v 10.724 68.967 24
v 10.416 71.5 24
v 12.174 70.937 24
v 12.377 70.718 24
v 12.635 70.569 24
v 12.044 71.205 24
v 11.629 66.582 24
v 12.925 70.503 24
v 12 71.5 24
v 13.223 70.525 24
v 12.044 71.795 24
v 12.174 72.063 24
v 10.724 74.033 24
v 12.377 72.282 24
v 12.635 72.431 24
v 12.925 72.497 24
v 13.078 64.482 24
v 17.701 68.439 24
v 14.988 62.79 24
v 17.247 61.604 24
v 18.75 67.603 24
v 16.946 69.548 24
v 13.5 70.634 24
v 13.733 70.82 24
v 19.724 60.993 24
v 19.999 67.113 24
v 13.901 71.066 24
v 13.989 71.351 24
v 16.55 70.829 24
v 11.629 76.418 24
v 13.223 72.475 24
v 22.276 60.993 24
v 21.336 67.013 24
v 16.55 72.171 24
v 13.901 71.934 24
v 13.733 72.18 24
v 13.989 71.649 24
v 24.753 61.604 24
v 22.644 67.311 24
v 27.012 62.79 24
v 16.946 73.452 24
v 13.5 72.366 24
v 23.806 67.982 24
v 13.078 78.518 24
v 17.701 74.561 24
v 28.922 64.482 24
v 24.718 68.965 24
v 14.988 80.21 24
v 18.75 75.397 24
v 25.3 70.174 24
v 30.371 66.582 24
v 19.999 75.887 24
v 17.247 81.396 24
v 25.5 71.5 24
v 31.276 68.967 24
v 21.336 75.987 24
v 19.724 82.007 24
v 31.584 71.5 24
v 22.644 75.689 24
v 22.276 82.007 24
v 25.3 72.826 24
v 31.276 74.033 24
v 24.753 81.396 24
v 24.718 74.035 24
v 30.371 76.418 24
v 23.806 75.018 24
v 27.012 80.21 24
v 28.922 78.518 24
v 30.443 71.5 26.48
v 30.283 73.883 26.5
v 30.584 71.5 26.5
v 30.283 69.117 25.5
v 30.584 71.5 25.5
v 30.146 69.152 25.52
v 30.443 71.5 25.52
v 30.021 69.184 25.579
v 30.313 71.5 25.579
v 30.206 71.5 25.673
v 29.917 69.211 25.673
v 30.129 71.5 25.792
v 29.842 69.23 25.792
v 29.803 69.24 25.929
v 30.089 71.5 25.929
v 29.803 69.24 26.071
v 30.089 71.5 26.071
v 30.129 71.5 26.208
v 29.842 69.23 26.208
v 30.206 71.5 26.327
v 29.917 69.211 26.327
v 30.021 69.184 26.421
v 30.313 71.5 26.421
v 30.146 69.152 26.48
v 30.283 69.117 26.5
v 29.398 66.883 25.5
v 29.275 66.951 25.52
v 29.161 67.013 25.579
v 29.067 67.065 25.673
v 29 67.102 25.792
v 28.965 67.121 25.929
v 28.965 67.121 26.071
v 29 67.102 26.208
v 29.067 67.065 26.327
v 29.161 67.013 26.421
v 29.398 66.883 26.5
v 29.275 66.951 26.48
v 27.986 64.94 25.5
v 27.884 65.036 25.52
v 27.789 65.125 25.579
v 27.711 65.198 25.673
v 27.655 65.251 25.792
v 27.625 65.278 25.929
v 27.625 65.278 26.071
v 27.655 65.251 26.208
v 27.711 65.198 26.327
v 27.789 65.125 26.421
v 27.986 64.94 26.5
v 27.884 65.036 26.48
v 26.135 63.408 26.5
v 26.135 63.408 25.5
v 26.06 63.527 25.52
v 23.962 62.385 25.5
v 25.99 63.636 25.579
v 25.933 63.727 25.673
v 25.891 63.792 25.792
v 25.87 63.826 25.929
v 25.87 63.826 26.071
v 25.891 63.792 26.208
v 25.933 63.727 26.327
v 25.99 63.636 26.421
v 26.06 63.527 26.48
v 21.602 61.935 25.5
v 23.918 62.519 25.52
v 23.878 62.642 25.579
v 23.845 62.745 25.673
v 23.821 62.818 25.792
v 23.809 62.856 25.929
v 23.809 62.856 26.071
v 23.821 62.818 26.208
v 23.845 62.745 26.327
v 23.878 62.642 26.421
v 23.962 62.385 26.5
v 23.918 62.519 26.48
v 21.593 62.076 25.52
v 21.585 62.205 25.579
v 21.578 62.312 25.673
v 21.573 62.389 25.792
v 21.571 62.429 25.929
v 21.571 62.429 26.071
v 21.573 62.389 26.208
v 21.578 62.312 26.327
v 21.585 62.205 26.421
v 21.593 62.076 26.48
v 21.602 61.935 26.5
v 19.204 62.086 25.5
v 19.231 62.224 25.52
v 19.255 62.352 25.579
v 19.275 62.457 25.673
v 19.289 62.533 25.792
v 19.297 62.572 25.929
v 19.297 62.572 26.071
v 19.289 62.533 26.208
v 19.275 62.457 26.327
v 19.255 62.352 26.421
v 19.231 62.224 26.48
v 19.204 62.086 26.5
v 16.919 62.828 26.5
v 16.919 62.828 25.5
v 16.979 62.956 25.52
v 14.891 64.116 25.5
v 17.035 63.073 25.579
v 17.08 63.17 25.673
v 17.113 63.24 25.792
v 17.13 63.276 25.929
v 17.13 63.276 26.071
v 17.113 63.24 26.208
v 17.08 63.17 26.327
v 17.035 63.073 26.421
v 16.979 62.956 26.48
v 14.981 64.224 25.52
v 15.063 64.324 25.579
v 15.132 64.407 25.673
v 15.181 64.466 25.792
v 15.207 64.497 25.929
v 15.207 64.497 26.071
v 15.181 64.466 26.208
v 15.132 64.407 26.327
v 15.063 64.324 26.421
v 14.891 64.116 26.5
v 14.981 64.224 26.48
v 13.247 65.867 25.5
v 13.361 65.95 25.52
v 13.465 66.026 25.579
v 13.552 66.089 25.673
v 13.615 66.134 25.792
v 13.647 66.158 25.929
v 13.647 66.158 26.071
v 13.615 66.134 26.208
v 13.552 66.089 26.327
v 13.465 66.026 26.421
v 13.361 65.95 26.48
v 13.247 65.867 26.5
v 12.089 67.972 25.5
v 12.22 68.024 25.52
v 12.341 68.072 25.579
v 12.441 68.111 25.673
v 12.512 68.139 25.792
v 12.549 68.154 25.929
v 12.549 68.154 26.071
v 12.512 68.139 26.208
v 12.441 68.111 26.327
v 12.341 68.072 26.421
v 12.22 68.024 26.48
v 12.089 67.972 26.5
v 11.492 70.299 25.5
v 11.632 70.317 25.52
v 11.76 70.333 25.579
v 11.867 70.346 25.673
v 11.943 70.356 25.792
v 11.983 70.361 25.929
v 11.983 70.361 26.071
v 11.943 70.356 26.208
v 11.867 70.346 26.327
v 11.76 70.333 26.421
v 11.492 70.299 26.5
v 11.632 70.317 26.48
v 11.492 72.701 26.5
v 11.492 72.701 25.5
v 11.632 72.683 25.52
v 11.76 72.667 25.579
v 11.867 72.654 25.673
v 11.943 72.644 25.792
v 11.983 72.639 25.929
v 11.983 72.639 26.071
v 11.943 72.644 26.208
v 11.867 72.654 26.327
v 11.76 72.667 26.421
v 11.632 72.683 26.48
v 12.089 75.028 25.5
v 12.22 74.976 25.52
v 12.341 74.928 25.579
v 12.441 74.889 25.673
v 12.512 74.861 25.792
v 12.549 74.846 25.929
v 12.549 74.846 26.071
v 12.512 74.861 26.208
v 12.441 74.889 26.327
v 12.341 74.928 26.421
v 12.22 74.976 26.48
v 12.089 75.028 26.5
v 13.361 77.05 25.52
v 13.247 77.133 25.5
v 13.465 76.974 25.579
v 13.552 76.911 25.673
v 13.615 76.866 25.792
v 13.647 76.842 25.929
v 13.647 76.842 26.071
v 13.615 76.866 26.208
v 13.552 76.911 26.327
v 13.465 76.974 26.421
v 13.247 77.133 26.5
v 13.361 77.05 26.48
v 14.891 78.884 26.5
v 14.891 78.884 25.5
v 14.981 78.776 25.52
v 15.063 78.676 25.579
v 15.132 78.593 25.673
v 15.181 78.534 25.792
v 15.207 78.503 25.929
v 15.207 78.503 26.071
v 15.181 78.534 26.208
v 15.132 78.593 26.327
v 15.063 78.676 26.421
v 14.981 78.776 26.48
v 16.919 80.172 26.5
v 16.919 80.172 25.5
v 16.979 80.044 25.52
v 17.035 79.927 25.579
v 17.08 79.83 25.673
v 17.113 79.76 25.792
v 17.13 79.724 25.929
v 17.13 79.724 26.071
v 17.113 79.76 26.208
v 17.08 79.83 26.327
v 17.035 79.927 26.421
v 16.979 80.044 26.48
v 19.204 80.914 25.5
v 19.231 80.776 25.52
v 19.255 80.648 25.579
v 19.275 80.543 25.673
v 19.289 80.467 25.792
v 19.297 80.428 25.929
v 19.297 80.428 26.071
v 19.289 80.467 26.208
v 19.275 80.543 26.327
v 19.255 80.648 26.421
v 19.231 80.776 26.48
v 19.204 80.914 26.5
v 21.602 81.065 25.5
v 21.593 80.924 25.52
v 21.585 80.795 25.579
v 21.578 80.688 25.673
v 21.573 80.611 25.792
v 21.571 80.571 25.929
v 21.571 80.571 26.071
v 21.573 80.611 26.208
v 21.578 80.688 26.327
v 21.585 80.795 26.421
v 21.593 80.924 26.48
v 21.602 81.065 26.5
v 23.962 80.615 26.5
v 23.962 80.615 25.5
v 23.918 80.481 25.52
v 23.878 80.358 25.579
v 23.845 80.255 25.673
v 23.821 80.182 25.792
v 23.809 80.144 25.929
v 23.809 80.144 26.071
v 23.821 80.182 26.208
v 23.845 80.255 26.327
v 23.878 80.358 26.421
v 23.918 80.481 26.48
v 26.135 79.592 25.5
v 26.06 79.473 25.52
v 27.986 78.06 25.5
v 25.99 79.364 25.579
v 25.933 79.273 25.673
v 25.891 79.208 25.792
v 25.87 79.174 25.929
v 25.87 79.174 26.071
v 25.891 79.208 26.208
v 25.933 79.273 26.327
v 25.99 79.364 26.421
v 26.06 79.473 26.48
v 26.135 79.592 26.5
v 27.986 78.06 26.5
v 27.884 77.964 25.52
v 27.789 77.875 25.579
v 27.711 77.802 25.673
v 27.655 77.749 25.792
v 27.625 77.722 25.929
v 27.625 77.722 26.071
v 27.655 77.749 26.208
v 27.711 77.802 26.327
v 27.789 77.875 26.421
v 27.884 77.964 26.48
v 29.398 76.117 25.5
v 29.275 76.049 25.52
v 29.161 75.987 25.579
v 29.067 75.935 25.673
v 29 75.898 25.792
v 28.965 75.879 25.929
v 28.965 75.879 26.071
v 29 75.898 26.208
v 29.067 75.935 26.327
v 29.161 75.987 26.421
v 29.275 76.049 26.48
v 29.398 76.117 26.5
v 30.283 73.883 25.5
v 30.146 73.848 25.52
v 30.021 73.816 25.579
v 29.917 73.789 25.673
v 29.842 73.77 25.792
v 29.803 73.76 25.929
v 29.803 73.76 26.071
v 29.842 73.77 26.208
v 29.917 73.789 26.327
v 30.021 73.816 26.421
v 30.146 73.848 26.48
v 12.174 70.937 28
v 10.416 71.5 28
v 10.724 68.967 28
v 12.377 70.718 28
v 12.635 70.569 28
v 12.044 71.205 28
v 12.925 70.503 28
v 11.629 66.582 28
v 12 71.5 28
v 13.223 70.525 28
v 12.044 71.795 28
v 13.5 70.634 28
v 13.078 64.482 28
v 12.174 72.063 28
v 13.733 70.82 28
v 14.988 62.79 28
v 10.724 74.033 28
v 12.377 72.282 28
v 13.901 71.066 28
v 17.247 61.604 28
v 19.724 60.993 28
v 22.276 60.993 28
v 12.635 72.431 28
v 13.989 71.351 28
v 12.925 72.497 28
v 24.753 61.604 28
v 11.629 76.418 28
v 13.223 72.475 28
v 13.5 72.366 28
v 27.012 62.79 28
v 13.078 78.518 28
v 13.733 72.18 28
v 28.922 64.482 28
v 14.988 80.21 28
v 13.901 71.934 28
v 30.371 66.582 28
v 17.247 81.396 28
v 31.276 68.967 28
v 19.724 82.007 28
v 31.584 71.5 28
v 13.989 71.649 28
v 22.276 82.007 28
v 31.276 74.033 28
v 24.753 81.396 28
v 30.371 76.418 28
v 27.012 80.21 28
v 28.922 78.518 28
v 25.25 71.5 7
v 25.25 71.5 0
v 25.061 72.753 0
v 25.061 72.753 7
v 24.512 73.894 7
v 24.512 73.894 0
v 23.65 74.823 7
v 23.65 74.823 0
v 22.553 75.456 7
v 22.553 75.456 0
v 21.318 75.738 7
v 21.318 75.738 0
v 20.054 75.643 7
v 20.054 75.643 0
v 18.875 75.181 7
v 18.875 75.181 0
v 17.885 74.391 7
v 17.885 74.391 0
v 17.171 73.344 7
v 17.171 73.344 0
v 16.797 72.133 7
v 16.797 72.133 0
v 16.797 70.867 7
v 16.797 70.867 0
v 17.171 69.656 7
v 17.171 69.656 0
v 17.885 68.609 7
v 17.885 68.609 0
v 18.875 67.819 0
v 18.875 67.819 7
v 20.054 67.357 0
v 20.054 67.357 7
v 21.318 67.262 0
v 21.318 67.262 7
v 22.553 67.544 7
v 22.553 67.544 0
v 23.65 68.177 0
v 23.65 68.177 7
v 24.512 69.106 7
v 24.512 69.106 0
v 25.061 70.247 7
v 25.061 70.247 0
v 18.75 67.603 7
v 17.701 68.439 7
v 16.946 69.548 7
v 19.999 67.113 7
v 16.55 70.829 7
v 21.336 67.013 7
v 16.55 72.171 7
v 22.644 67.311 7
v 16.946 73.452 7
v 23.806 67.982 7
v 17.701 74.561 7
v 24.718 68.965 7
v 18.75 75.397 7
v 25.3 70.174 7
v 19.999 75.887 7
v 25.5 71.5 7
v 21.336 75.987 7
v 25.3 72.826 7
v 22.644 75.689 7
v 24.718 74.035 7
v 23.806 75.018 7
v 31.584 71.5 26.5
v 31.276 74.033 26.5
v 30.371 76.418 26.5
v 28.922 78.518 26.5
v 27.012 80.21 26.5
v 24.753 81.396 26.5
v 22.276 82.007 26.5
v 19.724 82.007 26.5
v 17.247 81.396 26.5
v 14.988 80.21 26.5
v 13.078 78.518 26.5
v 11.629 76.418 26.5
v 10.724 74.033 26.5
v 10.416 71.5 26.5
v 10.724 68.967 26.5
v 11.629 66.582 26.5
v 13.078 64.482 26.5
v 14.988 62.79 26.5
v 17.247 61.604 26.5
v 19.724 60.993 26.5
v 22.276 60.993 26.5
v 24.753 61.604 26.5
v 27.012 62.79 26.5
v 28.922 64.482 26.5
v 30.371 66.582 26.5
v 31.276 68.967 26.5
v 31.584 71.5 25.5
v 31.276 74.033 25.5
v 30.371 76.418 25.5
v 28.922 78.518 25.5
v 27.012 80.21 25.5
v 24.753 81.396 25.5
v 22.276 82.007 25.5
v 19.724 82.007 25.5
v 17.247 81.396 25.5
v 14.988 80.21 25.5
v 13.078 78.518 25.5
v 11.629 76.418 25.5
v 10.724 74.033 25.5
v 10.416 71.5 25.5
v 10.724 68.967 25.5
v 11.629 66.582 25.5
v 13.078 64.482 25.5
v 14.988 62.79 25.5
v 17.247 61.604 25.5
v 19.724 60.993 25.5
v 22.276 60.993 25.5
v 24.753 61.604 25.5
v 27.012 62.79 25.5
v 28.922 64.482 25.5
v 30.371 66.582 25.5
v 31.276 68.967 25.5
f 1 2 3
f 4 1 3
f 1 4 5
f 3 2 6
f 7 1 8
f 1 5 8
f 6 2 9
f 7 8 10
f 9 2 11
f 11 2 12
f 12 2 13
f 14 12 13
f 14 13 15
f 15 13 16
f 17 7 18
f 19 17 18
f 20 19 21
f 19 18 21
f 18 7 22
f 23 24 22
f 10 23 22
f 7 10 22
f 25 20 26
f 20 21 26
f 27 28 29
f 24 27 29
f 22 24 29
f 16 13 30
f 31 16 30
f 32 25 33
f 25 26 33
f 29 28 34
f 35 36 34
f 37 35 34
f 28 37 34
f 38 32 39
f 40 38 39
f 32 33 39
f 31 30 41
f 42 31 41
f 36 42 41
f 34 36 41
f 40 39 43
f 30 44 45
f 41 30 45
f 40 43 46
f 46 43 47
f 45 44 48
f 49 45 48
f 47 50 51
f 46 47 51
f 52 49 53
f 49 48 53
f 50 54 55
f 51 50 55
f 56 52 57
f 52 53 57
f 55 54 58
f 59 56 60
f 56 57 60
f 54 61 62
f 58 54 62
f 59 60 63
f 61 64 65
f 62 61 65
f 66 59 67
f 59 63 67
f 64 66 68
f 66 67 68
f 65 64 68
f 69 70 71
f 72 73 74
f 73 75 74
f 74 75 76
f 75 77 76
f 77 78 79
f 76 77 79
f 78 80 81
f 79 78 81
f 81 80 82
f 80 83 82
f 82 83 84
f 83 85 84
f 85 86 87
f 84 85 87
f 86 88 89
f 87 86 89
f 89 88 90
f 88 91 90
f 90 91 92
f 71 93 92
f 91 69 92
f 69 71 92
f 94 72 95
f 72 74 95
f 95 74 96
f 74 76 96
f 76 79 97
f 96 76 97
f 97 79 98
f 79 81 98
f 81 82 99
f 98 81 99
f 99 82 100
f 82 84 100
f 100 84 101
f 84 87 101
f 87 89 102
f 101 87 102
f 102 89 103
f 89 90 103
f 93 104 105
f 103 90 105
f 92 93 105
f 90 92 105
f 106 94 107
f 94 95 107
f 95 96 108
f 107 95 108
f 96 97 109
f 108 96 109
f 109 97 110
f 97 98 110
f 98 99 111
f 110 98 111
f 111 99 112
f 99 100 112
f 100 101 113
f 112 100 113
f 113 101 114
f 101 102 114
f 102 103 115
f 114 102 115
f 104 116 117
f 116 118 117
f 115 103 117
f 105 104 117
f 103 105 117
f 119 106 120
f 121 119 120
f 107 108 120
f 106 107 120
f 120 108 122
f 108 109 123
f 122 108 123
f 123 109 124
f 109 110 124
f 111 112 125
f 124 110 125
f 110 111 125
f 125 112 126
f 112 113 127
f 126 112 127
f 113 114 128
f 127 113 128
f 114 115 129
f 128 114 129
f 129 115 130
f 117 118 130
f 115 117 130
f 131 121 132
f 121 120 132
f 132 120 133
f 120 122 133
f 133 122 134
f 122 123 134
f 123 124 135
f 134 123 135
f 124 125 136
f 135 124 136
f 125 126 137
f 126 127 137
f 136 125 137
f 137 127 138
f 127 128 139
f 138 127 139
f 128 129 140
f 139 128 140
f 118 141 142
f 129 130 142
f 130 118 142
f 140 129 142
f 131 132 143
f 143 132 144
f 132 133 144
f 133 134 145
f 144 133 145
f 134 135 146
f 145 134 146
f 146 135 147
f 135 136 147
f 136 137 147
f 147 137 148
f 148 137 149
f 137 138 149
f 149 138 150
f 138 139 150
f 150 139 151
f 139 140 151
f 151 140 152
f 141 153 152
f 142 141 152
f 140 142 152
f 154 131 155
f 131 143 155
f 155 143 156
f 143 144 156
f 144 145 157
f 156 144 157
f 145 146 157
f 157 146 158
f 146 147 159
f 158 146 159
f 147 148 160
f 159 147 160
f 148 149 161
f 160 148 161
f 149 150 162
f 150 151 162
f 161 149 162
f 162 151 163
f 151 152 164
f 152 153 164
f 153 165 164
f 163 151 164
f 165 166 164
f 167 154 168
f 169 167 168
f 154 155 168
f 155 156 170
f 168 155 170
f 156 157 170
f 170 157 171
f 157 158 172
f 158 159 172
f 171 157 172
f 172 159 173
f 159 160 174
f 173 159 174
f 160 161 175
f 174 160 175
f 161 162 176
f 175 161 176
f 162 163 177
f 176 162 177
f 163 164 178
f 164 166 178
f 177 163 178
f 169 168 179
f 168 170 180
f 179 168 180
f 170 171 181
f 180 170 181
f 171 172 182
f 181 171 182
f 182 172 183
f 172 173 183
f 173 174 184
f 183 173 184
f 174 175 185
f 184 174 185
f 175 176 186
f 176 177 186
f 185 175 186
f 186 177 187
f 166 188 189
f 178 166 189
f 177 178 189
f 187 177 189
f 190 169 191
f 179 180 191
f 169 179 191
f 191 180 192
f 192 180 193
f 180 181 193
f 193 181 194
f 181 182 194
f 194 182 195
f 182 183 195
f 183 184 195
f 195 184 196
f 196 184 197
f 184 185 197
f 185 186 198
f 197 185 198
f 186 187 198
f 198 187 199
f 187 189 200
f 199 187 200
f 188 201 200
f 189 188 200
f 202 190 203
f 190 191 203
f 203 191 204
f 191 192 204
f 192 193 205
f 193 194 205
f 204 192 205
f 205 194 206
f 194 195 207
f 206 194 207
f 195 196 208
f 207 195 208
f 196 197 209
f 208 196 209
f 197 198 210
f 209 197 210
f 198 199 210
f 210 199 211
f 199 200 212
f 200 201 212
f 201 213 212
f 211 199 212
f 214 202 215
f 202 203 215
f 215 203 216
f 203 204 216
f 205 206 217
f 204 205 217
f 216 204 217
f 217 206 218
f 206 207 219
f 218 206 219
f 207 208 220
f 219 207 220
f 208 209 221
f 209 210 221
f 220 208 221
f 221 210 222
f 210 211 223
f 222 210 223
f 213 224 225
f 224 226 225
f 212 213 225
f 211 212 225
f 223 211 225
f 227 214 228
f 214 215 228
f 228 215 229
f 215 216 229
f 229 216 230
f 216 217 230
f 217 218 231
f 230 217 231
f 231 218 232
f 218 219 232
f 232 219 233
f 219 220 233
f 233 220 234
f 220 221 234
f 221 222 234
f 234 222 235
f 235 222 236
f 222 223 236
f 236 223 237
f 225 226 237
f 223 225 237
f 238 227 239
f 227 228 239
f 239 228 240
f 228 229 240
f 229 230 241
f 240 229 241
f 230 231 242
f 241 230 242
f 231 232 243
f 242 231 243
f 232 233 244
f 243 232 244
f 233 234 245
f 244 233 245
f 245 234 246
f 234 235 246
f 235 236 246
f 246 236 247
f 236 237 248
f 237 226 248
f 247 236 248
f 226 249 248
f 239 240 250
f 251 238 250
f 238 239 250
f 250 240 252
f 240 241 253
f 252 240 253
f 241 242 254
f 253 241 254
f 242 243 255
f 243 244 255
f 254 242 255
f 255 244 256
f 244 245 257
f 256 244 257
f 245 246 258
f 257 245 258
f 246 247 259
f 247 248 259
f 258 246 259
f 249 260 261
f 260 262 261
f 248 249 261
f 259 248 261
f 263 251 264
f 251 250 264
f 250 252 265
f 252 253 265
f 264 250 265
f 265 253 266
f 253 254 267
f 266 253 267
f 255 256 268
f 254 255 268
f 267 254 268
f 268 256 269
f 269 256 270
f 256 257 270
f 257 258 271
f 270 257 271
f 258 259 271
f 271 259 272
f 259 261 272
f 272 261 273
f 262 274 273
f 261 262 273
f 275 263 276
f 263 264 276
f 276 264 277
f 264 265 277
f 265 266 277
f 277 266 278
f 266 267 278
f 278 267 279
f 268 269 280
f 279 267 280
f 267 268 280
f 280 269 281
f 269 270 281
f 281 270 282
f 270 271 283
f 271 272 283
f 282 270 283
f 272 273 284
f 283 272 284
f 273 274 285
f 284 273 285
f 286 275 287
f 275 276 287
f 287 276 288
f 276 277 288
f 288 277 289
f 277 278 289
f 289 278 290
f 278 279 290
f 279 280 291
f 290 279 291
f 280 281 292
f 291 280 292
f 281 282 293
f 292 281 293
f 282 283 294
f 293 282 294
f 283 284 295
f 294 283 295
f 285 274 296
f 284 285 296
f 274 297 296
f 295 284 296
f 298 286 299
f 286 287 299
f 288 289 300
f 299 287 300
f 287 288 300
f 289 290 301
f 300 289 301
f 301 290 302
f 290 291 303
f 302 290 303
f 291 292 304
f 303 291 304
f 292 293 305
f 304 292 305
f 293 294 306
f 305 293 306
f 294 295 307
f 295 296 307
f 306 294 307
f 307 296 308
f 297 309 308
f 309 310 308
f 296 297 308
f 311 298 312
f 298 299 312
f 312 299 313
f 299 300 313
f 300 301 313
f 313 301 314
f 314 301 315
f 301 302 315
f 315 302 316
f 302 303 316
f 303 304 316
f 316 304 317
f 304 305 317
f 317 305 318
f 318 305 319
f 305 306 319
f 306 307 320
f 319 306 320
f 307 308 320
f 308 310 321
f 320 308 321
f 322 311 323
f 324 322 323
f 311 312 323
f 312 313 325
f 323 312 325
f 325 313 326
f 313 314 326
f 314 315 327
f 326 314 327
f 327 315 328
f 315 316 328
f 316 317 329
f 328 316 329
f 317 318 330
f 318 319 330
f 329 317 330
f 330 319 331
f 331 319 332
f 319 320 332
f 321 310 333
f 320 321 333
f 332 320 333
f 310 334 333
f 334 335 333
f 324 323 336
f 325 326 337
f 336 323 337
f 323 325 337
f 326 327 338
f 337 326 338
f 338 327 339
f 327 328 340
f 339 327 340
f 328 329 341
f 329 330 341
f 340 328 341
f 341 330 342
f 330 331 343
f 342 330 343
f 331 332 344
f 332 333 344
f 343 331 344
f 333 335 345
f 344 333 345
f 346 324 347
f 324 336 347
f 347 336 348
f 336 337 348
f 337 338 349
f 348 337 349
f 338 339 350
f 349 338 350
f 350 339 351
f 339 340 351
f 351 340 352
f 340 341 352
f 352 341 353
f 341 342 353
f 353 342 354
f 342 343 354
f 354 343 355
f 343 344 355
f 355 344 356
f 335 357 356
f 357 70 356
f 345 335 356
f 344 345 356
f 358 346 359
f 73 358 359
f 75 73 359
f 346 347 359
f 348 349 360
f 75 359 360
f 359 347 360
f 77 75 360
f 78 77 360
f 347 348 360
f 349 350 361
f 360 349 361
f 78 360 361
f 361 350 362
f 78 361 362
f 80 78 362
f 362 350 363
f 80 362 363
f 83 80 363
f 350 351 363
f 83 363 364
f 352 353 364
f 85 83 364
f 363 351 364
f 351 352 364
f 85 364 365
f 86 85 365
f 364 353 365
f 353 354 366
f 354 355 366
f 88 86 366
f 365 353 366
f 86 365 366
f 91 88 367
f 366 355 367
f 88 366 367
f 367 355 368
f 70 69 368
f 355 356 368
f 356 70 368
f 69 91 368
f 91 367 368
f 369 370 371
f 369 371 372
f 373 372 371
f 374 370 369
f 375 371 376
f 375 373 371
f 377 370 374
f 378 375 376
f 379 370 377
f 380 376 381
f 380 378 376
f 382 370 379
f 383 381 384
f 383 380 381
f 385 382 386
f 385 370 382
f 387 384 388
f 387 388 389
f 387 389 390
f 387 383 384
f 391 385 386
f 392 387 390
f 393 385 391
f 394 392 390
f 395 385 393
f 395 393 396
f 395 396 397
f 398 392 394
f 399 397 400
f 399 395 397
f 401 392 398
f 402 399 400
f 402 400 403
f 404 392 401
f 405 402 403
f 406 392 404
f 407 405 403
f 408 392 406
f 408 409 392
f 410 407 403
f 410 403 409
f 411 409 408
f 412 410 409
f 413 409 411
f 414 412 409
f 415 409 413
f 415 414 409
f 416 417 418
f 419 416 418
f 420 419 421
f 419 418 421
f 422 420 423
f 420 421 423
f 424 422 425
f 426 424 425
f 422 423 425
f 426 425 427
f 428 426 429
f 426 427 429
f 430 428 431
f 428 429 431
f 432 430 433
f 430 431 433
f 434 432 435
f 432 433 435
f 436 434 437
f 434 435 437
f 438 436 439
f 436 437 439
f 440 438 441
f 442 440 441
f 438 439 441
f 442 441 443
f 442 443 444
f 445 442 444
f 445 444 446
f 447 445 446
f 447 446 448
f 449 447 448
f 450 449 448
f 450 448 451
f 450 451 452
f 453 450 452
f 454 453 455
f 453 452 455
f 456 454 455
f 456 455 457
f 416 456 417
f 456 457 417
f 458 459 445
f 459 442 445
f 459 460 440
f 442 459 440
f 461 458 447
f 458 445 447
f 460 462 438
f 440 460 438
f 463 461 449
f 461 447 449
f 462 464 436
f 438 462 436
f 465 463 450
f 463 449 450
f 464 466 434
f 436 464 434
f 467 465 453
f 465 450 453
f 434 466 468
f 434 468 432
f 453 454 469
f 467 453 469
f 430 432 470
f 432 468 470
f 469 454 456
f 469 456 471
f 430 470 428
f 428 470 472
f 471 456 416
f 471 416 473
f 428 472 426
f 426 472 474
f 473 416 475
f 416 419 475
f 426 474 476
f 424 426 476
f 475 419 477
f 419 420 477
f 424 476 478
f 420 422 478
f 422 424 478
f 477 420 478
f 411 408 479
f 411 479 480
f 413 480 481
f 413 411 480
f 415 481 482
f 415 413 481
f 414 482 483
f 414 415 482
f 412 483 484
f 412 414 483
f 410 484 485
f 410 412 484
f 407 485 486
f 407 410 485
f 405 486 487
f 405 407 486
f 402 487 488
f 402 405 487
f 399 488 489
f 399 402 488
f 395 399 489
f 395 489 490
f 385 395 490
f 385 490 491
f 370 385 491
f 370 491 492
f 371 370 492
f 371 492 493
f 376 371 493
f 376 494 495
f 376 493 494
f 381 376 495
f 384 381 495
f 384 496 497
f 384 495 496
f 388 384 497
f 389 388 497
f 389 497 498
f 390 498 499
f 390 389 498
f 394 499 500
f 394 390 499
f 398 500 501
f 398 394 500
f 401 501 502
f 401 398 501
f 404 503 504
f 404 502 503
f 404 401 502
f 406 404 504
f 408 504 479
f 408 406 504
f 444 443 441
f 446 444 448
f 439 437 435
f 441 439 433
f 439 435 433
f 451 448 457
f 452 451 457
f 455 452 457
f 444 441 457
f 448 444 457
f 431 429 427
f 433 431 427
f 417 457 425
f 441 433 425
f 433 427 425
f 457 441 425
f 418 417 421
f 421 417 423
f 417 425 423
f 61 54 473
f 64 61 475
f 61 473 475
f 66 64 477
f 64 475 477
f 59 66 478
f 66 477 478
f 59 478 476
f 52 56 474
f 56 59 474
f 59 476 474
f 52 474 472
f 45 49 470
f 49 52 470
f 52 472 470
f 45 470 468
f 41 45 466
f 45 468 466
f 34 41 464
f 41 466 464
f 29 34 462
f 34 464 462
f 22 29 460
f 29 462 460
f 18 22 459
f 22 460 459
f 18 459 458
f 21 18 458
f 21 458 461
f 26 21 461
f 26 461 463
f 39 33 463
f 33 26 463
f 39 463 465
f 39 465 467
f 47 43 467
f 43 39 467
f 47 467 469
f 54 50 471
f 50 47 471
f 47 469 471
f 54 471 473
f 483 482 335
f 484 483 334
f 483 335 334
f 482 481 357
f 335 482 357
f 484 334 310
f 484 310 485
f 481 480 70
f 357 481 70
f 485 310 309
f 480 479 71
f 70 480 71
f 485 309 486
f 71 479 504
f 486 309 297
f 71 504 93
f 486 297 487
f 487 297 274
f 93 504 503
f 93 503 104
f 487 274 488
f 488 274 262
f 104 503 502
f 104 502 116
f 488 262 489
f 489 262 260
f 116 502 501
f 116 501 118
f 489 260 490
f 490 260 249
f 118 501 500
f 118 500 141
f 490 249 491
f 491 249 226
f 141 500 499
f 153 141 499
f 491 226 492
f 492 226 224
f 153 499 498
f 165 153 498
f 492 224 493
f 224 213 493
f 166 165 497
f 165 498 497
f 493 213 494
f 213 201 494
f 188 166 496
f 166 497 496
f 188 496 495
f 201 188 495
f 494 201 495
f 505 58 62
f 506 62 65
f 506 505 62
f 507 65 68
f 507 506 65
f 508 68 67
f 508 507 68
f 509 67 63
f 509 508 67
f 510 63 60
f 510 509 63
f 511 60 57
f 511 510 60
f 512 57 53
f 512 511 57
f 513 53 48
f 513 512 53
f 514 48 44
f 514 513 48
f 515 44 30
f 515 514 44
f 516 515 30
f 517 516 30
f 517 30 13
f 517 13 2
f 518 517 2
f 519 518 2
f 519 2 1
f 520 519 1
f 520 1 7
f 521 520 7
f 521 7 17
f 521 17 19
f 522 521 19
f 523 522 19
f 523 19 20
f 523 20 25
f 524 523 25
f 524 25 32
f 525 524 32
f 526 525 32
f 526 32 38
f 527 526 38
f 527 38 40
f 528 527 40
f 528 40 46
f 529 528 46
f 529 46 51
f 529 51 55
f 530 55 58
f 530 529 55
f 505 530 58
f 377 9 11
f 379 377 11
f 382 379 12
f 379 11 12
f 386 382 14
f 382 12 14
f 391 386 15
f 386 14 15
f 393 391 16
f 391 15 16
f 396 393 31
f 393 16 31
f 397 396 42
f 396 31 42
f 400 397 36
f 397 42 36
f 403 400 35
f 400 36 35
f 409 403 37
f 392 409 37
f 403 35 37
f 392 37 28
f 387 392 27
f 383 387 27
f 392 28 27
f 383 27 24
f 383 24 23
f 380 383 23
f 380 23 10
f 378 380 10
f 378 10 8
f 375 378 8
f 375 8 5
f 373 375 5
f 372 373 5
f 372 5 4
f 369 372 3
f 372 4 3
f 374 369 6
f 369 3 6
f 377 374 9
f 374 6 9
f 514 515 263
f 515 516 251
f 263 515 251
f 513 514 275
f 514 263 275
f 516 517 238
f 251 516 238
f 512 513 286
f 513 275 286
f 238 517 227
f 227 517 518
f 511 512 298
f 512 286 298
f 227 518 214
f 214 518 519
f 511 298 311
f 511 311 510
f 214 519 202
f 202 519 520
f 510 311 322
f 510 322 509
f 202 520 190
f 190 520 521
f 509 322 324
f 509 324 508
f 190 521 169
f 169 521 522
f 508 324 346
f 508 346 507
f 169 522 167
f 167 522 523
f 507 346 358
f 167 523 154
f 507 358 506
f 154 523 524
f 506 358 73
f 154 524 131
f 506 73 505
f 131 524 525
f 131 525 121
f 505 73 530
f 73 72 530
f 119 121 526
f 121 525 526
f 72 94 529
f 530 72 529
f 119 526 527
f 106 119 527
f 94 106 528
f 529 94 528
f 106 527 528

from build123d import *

# Parameters (mm, degrees)
SKETCH1_R           = 4.25
BOSS_EXTRUDE1_DEPTH = 7
SKETCH2_R           = 4.5
BOSS_EXTRUDE2_DEPTH = 21
SKETCH3_R           = 10.583681917
BOSS_EXTRUDE3_DEPTH = 4
SKETCH8_R           = 1
CUT_EXTRUDE1_DEPTH  = 4


with BuildPart() as part:
    # Sketch1 → Boss-Extrude1 (new body)
    with BuildSketch(Plane.XY):
        with Locations((21, 71.5)):
            Circle(SKETCH1_R)
    extrude(amount=BOSS_EXTRUDE1_DEPTH)

    # Sketch2 → Boss-Extrude2 (add)
    with BuildSketch(Plane.XY.offset(7)):
        with Locations((21, 71.5)):
            Circle(SKETCH2_R)
    extrude(amount=BOSS_EXTRUDE2_DEPTH)

    # Sketch3 → Boss-Extrude3 (add)
    with BuildSketch(Plane.XY.offset(28)):
        with Locations((21, 71.5)):
            Circle(SKETCH3_R)
    extrude(amount=-BOSS_EXTRUDE3_DEPTH)

    # Sketch6 → Cut-Revolve1 (revolve, cut)
    with BuildSketch(Plane(origin=(0, 71.5, 0), x_dir=(1, 0, 0), z_dir=(0, 1, 0))):
        with BuildLine():
            Line((31.583681917, -26.5), (31.583681917, -25.5))
            Line((31.583681917, -25.5), (30.583681917, -25.5))
            ThreePointArc((30.583681917, -25.5), (30.083681917, -26), (30.583681917, -26.5))
            Line((30.583681917, -26.5), (31.583681917, -26.5))
        make_face()
    revolve(axis=Axis((21, 71.5, 28), (0, 0, -1)), mode=Mode.SUBTRACT)

    # Sketch8 → Cut-Extrude1 (cut)
    with BuildSketch(Plane(origin=(0, 0, 24), x_dir=(-1, 0, 0), z_dir=(0, 0, -1))):
        with Locations((-13, 71.5)):
            Circle(SKETCH8_R)
    extrude(amount=-CUT_EXTRUDE1_DEPTH, mode=Mode.SUBTRACT)


solid = part.part
